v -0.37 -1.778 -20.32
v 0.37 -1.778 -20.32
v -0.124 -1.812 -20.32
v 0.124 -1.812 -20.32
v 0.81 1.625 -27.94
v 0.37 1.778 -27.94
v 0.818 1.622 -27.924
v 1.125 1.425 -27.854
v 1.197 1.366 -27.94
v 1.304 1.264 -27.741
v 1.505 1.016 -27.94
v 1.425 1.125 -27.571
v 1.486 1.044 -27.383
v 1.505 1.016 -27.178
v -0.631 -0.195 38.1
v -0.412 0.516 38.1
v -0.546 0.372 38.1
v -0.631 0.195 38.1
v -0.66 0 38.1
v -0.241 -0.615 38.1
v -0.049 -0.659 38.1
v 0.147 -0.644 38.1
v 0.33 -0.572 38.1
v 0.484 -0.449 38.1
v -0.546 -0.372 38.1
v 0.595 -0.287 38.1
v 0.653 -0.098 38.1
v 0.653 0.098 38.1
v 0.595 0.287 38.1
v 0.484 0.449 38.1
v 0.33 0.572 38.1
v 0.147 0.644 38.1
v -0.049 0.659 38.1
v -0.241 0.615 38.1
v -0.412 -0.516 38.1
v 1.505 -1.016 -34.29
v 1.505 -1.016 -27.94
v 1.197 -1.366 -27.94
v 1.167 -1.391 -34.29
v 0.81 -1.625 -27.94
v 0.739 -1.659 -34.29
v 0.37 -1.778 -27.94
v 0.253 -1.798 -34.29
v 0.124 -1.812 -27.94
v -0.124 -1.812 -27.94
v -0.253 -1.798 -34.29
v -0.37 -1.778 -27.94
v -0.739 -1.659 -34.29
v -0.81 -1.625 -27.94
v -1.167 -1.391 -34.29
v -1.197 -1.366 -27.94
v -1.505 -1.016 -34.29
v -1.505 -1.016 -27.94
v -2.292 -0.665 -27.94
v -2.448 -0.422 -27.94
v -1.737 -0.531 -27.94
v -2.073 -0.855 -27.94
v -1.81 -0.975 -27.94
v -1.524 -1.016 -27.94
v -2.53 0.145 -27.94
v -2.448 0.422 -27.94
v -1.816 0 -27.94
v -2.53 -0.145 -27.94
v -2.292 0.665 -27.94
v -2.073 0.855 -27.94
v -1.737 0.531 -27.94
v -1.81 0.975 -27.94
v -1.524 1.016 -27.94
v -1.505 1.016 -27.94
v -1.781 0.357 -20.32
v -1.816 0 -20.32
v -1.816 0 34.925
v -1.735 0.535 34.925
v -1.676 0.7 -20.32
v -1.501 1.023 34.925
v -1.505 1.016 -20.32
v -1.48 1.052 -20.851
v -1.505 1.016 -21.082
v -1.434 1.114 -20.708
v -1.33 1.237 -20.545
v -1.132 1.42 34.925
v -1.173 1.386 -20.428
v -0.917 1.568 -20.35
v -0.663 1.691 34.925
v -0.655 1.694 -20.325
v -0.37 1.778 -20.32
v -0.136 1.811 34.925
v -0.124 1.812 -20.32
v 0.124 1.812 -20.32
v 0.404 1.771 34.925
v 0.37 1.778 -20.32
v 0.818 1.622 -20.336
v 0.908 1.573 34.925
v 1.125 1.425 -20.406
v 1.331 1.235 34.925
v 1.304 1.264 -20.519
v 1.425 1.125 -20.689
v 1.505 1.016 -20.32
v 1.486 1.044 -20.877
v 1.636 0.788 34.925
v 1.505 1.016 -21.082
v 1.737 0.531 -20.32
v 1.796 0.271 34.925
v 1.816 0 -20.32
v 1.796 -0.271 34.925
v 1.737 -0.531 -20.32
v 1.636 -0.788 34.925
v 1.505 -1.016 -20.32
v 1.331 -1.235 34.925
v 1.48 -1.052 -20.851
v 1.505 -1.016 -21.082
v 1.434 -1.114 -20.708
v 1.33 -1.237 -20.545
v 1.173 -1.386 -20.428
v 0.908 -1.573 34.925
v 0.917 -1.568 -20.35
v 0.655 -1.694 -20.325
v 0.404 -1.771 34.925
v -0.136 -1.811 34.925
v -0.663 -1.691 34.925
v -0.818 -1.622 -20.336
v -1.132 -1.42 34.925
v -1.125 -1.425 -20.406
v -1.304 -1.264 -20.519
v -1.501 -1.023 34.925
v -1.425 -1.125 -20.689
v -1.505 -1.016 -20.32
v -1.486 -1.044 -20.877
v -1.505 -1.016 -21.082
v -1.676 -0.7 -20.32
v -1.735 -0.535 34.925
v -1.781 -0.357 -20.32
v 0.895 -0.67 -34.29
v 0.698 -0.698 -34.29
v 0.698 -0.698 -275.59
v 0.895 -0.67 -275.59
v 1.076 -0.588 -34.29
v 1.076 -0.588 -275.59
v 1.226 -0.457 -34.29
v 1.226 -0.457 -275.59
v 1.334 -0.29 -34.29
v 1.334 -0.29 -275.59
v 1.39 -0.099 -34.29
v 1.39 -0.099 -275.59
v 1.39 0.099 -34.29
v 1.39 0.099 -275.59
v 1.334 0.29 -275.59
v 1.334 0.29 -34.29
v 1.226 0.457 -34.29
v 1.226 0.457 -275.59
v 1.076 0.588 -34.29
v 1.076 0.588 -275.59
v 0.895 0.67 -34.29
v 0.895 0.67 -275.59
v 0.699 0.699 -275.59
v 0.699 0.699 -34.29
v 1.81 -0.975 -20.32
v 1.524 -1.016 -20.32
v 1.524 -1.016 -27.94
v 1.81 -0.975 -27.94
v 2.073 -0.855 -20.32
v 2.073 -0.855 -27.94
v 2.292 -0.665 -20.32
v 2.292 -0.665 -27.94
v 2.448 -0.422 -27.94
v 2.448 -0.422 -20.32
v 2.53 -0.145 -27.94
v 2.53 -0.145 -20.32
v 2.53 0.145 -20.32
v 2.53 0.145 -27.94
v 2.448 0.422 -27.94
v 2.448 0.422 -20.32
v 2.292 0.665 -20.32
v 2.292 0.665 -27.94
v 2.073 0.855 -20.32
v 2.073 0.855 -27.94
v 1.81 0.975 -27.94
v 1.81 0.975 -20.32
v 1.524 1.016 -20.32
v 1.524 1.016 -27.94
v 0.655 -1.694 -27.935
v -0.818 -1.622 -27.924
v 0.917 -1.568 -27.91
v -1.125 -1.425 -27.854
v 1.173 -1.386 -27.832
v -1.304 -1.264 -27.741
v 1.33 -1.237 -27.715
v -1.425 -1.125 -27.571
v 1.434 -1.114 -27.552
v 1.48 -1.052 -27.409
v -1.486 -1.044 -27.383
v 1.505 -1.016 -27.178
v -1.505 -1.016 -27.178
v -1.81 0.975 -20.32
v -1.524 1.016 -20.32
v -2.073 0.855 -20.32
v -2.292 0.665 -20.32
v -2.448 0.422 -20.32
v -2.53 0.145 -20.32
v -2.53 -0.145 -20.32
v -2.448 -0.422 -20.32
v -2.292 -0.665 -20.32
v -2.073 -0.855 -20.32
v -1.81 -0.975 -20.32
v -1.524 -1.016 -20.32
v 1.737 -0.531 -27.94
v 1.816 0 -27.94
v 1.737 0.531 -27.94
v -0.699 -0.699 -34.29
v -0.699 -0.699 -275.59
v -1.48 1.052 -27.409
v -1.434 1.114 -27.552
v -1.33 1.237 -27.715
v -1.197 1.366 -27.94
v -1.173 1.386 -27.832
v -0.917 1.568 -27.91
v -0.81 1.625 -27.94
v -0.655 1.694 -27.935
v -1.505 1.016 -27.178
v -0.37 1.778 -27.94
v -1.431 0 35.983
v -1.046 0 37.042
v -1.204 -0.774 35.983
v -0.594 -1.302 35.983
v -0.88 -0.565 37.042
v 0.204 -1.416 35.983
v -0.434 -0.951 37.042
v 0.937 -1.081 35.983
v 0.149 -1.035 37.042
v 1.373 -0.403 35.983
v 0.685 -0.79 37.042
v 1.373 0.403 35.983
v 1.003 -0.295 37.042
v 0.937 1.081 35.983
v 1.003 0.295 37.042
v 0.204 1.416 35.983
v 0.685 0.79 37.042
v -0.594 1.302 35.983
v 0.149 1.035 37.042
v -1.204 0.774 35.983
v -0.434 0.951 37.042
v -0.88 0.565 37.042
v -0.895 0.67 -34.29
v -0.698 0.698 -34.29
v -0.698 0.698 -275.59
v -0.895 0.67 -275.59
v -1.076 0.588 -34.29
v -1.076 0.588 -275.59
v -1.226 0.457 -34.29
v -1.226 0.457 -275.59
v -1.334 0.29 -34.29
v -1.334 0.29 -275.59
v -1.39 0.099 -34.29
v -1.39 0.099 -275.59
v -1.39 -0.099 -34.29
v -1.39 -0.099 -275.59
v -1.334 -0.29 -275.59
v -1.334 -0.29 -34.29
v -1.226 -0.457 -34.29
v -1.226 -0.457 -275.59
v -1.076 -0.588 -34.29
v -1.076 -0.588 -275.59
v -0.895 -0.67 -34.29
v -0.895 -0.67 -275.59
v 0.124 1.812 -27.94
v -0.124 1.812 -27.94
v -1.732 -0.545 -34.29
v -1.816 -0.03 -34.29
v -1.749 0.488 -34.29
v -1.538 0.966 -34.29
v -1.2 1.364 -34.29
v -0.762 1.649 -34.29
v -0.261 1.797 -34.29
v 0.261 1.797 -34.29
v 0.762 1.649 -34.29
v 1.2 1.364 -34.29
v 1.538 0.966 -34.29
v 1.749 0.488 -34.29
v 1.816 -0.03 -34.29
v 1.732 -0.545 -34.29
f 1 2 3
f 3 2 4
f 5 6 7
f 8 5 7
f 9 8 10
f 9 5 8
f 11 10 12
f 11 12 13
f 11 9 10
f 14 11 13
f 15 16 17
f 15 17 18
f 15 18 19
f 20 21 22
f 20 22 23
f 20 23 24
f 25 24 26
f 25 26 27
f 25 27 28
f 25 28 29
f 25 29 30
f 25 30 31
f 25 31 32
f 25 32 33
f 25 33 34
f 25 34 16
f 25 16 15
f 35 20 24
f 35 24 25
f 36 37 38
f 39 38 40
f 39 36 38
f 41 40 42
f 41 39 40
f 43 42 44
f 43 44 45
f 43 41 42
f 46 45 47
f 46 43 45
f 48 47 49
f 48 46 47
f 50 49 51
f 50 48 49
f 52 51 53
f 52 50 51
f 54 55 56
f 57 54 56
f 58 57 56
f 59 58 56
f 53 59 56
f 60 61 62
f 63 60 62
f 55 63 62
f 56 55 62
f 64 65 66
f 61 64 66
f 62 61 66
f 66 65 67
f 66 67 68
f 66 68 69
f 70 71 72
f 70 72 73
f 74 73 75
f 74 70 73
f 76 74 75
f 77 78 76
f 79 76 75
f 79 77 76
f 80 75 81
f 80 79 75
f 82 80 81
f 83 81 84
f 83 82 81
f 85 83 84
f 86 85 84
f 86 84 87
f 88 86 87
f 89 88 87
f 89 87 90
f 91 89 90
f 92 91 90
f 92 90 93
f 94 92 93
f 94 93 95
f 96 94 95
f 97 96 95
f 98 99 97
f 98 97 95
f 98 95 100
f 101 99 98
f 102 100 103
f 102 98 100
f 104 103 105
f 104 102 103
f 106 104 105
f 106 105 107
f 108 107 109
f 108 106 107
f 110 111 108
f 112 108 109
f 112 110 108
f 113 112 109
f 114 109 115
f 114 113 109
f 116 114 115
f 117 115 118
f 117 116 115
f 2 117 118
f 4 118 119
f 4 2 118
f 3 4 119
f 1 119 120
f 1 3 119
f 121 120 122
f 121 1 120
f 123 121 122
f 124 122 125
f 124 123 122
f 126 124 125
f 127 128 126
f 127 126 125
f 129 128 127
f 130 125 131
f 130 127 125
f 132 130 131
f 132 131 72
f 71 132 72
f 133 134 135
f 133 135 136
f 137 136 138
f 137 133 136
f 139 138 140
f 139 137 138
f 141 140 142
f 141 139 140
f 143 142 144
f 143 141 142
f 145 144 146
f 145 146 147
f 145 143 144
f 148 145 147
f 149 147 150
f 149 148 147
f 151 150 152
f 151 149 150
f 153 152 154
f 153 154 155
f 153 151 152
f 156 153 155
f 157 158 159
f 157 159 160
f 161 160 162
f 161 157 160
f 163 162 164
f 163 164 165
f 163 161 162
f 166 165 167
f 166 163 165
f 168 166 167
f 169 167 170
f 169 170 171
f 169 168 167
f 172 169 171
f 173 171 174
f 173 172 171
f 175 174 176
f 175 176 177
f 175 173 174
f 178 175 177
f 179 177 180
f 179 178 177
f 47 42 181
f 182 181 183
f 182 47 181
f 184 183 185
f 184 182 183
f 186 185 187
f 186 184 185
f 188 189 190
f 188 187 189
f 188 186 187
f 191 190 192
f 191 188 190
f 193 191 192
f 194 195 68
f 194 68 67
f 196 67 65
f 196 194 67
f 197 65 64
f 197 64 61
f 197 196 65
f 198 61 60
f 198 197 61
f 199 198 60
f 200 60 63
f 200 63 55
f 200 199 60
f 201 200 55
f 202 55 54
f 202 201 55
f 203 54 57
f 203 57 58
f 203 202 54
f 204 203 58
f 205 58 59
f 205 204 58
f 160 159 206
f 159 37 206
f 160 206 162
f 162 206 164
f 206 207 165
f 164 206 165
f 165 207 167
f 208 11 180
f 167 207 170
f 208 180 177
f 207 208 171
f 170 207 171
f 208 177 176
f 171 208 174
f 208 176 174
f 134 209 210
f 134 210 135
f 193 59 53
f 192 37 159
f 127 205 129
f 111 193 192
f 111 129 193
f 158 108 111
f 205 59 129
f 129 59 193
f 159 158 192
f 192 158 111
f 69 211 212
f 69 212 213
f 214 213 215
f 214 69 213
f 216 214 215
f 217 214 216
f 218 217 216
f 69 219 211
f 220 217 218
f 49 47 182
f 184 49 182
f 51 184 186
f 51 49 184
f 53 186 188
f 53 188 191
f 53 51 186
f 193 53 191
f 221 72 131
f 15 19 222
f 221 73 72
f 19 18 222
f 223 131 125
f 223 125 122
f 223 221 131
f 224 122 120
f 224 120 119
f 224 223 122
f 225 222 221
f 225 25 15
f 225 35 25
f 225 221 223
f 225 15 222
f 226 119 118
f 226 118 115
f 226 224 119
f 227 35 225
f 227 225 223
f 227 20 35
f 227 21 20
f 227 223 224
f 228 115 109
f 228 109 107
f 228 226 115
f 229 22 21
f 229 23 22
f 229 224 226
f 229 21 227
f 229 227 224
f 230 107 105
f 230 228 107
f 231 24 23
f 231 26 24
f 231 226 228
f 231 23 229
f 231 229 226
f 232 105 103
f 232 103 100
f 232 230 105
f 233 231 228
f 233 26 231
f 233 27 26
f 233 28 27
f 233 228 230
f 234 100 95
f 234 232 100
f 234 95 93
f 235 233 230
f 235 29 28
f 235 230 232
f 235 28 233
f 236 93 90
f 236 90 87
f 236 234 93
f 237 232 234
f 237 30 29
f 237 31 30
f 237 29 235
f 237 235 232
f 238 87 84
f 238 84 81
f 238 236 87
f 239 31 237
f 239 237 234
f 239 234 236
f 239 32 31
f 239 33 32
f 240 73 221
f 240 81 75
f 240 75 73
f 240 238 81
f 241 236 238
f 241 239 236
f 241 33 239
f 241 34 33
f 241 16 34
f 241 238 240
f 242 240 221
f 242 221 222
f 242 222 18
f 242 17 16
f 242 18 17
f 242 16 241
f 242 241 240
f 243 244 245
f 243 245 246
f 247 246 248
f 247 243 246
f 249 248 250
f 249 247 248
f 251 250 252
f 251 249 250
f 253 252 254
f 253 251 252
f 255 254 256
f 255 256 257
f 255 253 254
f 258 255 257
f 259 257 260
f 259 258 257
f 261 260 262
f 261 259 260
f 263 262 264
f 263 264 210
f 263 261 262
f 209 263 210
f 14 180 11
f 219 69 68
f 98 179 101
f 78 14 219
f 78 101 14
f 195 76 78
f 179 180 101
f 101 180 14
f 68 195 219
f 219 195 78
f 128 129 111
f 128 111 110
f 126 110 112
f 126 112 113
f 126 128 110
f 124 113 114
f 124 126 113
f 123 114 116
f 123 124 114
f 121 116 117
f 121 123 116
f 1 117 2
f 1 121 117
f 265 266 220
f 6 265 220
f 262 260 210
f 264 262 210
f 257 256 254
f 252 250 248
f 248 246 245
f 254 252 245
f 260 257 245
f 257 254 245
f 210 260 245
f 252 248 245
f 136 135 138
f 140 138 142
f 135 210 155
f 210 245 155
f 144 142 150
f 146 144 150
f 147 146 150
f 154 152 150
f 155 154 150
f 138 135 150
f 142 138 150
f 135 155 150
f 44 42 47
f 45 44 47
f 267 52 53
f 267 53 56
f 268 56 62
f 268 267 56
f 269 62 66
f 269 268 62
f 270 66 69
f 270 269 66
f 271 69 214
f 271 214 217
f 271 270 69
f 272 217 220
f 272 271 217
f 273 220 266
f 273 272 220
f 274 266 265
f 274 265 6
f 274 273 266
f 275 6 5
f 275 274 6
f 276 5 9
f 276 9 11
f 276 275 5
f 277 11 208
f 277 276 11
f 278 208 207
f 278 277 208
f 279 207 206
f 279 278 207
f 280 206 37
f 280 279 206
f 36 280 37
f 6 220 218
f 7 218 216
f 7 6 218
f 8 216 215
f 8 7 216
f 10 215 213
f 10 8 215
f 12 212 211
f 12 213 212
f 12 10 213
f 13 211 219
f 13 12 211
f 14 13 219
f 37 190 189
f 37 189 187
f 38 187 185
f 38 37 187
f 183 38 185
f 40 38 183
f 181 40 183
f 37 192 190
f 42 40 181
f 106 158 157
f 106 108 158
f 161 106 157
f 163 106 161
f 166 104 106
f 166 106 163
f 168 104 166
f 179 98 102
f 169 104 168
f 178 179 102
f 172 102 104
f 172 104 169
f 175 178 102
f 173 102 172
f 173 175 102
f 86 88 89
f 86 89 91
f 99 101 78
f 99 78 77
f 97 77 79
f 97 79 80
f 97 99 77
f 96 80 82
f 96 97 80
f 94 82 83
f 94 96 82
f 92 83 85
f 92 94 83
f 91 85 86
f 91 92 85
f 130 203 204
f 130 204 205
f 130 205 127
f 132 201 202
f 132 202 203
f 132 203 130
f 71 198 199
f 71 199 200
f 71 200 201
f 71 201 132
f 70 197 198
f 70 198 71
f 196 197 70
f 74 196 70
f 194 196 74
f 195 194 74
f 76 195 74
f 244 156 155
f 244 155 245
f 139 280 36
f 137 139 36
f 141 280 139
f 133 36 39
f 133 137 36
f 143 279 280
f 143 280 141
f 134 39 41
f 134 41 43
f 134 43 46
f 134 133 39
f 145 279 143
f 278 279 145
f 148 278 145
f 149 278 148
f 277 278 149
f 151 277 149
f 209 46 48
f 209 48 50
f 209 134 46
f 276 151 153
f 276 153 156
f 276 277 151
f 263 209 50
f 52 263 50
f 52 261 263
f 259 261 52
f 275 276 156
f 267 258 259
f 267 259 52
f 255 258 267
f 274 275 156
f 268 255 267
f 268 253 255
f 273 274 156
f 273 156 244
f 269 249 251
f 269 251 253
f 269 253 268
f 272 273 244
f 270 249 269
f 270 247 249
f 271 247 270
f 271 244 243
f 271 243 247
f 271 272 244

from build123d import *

# Parameters (mm, degrees)
SKETCH1_R           = 1.8161
BOSS_EXTRUDE1_DEPTH = 38.1
CHAMFER1_SIZE       = 3.175
CHAMFER1_SIZE2      = 1.155605494
BOSS_EXTRUDE2_START = 2.54
SKETCH2_R           = 1.8161
BOSS_EXTRUDE2_DEPTH = 2.54
BOSS_EXTRUDE3_START = 17.78
SKETCH3_R           = 1.8161
BOSS_EXTRUDE3_DEPTH = 17.78
BOSS_EXTRUDE4_DEPTH = 7.62
BOSS_EXTRUDE5_START = 6.35
BOSS_EXTRUDE5_DEPTH = 6.35
BOSS_EXTRUDE6_DEPTH = 241.3
FILLET2_R           = 0.762


with BuildPart() as part:
    # Sketch1 → Boss-Extrude1 (new body)
    with BuildSketch(Plane.XY):
        with Locations(Location((0, 0, 0), (0, 0, 180))):
            Circle(SKETCH1_R)
    extrude(amount=BOSS_EXTRUDE1_DEPTH)

    # Chamfer1
    chamfer1_edges = [part.edges().sort_by_distance(p)[0] for p in [
        (1.8161, 0, 38.1),
    ]]
    chamfer1_side = [part.faces().sort_by_distance(p)[0] for p in [
        (1.8161, 0, 19.05),
    ]]
    chamfer(chamfer1_edges, length=CHAMFER1_SIZE, length2=CHAMFER1_SIZE2, reference=chamfer1_side[0])

    # Sketch2 → Boss-Extrude2 (add)
    with BuildSketch(Plane(origin=(0, 0, 0), x_dir=(-1, 0, 0), z_dir=(0, 0, -1)).offset(BOSS_EXTRUDE2_START)):
        Circle(SKETCH2_R)
    extrude(amount=-BOSS_EXTRUDE2_DEPTH)

    # Sketch3 → Boss-Extrude3 (add)
    with BuildSketch(Plane(origin=(0, 0, -2.54), x_dir=(-1, 0, 0), z_dir=(0, 0, -1)).offset(BOSS_EXTRUDE3_START)):
        Circle(SKETCH3_R)
    extrude(amount=-BOSS_EXTRUDE3_DEPTH)

    # Sketch4 → Boss-Extrude4 (add)
    with BuildSketch(Plane(origin=(0, 0, -20.32), x_dir=(-1, 0, 0), z_dir=(0, 0, -1))):
        with BuildLine():
            Line((-1.524, 1.016), (1.524, 1.016))
            ThreePointArc((1.524, 1.016), (2.54, 0), (1.524, -1.016))
            Line((1.524, -1.016), (-1.524, -1.016))
            ThreePointArc((-1.524, -1.016), (-2.54, 0), (-1.524, 1.016))
        make_face()
    extrude(amount=BOSS_EXTRUDE4_DEPTH)

    # Sketch5 → Boss-Extrude5 (add)
    with BuildSketch(Plane(origin=(0, 0, -27.94), x_dir=(-1, 0, 0), z_dir=(0, 0, -1)).offset(BOSS_EXTRUDE5_START)):
        with BuildLine():
            ThreePointArc((-1.50542625, -1.01583021), (0, -1.8161), (1.50542625, -1.01583021))
            ThreePointArc((1.50542625, -1.01583021), (0, 1.8161), (-1.50542625, -1.01583021))
        make_face()
    extrude(amount=-BOSS_EXTRUDE5_DEPTH)

    # Sketch6 → Boss-Extrude6 (add)
    with BuildSketch(Plane(origin=(0, 0, -34.29), x_dir=(-1, 0, 0), z_dir=(0, 0, -1))):
        with BuildLine():
            Line((0.6985, -0.6985), (-0.6985, -0.6985))
            ThreePointArc((-0.6985, -0.6985), (-1.397, 0), (-0.6985, 0.6985))
            Line((-0.6985, 0.6985), (0.6985, 0.6985))
            ThreePointArc((0.6985, 0.6985), (1.397, 0), (0.6985, -0.6985))
        make_face()
    extrude(amount=BOSS_EXTRUDE6_DEPTH)

    # Fillet2
    # the kernel refuses this fillet: 0.762 mm, written as the material it adds along each edge
    with BuildSketch(Plane(origin=(-3.410311665, -1.016, -20.32), x_dir=(0, -1, 0), z_dir=(1, 0, 0))) as fillet2_piece_1_section:
        with BuildLine():
            CenterArc((FILLET2_R, FILLET2_R), FILLET2_R, 180, 90)
            Line((0, FILLET2_R), (0, 0))
            Line((0, 0), (FILLET2_R, 0))
        make_face()
    fillet2_piece_1 = extrude(amount=6.820623331, mode=Mode.PRIVATE)
    fillet2_piece_1 = fillet2_piece_1 & Plane(origin=(0, 0, -20.517592364), x_dir=(-1, 0, 0), z_dir=(0, 0, -1)) * Cylinder(1.8161, 17, mode=Mode.PRIVATE)
    add(fillet2_piece_1)
    with BuildSketch(Plane(origin=(3.410311665, 1.016, -20.32), x_dir=(0, 1, 0), z_dir=(-1, 0, 0))) as fillet2_piece_2_section:
        with BuildLine():
            CenterArc((FILLET2_R, FILLET2_R), FILLET2_R, 180, 90)
            Line((0, FILLET2_R), (0, 0))
            Line((0, 0), (FILLET2_R, 0))
        make_face()
    fillet2_piece_2 = extrude(amount=6.820623331, mode=Mode.PRIVATE)
    fillet2_piece_2 = fillet2_piece_2 & Plane(origin=(0, 0, -20.517592364), x_dir=(-1, 0, 0), z_dir=(0, 0, -1)) * Cylinder(1.8161, 17, mode=Mode.PRIVATE)
    add(fillet2_piece_2)
    with BuildSketch(Plane(origin=(-3.410311665, -1.016, -27.94), x_dir=(0, 0, 1), z_dir=(1, 0, 0))) as fillet2_piece_3_section:
        with BuildLine():
            CenterArc((FILLET2_R, FILLET2_R), FILLET2_R, 180, 90)
            Line((0, FILLET2_R), (0, 0))
            Line((0, 0), (FILLET2_R, 0))
        make_face()
    fillet2_piece_3 = extrude(amount=6.820623331, mode=Mode.PRIVATE)
    fillet2_piece_3 = fillet2_piece_3 & Plane(origin=(0, 0, -27.742407671), x_dir=(0.8289335664335663, -0.5593470679638254, 0), z_dir=(0, 0, -1)) * Cylinder(1.8161, 17, mode=Mode.PRIVATE)
    add(fillet2_piece_3)
    with BuildSketch(Plane(origin=(3.410311665, 1.016, -27.94), x_dir=(0, 0, 1), z_dir=(-1, 0, 0))) as fillet2_piece_4_section:
        with BuildLine():
            CenterArc((FILLET2_R, FILLET2_R), FILLET2_R, 180, 90)
            Line((0, FILLET2_R), (0, 0))
            Line((0, 0), (FILLET2_R, 0))
        make_face()
    fillet2_piece_4 = extrude(amount=6.820623331, mode=Mode.PRIVATE)
    fillet2_piece_4 = fillet2_piece_4 & Plane(origin=(0, 0, -27.742407638), x_dir=(0.8289335664335663, -0.5593470679638254, 0), z_dir=(0, 0, -1)) * Cylinder(1.8161, 17, mode=Mode.PRIVATE)
    add(fillet2_piece_4)


solid = part.part
